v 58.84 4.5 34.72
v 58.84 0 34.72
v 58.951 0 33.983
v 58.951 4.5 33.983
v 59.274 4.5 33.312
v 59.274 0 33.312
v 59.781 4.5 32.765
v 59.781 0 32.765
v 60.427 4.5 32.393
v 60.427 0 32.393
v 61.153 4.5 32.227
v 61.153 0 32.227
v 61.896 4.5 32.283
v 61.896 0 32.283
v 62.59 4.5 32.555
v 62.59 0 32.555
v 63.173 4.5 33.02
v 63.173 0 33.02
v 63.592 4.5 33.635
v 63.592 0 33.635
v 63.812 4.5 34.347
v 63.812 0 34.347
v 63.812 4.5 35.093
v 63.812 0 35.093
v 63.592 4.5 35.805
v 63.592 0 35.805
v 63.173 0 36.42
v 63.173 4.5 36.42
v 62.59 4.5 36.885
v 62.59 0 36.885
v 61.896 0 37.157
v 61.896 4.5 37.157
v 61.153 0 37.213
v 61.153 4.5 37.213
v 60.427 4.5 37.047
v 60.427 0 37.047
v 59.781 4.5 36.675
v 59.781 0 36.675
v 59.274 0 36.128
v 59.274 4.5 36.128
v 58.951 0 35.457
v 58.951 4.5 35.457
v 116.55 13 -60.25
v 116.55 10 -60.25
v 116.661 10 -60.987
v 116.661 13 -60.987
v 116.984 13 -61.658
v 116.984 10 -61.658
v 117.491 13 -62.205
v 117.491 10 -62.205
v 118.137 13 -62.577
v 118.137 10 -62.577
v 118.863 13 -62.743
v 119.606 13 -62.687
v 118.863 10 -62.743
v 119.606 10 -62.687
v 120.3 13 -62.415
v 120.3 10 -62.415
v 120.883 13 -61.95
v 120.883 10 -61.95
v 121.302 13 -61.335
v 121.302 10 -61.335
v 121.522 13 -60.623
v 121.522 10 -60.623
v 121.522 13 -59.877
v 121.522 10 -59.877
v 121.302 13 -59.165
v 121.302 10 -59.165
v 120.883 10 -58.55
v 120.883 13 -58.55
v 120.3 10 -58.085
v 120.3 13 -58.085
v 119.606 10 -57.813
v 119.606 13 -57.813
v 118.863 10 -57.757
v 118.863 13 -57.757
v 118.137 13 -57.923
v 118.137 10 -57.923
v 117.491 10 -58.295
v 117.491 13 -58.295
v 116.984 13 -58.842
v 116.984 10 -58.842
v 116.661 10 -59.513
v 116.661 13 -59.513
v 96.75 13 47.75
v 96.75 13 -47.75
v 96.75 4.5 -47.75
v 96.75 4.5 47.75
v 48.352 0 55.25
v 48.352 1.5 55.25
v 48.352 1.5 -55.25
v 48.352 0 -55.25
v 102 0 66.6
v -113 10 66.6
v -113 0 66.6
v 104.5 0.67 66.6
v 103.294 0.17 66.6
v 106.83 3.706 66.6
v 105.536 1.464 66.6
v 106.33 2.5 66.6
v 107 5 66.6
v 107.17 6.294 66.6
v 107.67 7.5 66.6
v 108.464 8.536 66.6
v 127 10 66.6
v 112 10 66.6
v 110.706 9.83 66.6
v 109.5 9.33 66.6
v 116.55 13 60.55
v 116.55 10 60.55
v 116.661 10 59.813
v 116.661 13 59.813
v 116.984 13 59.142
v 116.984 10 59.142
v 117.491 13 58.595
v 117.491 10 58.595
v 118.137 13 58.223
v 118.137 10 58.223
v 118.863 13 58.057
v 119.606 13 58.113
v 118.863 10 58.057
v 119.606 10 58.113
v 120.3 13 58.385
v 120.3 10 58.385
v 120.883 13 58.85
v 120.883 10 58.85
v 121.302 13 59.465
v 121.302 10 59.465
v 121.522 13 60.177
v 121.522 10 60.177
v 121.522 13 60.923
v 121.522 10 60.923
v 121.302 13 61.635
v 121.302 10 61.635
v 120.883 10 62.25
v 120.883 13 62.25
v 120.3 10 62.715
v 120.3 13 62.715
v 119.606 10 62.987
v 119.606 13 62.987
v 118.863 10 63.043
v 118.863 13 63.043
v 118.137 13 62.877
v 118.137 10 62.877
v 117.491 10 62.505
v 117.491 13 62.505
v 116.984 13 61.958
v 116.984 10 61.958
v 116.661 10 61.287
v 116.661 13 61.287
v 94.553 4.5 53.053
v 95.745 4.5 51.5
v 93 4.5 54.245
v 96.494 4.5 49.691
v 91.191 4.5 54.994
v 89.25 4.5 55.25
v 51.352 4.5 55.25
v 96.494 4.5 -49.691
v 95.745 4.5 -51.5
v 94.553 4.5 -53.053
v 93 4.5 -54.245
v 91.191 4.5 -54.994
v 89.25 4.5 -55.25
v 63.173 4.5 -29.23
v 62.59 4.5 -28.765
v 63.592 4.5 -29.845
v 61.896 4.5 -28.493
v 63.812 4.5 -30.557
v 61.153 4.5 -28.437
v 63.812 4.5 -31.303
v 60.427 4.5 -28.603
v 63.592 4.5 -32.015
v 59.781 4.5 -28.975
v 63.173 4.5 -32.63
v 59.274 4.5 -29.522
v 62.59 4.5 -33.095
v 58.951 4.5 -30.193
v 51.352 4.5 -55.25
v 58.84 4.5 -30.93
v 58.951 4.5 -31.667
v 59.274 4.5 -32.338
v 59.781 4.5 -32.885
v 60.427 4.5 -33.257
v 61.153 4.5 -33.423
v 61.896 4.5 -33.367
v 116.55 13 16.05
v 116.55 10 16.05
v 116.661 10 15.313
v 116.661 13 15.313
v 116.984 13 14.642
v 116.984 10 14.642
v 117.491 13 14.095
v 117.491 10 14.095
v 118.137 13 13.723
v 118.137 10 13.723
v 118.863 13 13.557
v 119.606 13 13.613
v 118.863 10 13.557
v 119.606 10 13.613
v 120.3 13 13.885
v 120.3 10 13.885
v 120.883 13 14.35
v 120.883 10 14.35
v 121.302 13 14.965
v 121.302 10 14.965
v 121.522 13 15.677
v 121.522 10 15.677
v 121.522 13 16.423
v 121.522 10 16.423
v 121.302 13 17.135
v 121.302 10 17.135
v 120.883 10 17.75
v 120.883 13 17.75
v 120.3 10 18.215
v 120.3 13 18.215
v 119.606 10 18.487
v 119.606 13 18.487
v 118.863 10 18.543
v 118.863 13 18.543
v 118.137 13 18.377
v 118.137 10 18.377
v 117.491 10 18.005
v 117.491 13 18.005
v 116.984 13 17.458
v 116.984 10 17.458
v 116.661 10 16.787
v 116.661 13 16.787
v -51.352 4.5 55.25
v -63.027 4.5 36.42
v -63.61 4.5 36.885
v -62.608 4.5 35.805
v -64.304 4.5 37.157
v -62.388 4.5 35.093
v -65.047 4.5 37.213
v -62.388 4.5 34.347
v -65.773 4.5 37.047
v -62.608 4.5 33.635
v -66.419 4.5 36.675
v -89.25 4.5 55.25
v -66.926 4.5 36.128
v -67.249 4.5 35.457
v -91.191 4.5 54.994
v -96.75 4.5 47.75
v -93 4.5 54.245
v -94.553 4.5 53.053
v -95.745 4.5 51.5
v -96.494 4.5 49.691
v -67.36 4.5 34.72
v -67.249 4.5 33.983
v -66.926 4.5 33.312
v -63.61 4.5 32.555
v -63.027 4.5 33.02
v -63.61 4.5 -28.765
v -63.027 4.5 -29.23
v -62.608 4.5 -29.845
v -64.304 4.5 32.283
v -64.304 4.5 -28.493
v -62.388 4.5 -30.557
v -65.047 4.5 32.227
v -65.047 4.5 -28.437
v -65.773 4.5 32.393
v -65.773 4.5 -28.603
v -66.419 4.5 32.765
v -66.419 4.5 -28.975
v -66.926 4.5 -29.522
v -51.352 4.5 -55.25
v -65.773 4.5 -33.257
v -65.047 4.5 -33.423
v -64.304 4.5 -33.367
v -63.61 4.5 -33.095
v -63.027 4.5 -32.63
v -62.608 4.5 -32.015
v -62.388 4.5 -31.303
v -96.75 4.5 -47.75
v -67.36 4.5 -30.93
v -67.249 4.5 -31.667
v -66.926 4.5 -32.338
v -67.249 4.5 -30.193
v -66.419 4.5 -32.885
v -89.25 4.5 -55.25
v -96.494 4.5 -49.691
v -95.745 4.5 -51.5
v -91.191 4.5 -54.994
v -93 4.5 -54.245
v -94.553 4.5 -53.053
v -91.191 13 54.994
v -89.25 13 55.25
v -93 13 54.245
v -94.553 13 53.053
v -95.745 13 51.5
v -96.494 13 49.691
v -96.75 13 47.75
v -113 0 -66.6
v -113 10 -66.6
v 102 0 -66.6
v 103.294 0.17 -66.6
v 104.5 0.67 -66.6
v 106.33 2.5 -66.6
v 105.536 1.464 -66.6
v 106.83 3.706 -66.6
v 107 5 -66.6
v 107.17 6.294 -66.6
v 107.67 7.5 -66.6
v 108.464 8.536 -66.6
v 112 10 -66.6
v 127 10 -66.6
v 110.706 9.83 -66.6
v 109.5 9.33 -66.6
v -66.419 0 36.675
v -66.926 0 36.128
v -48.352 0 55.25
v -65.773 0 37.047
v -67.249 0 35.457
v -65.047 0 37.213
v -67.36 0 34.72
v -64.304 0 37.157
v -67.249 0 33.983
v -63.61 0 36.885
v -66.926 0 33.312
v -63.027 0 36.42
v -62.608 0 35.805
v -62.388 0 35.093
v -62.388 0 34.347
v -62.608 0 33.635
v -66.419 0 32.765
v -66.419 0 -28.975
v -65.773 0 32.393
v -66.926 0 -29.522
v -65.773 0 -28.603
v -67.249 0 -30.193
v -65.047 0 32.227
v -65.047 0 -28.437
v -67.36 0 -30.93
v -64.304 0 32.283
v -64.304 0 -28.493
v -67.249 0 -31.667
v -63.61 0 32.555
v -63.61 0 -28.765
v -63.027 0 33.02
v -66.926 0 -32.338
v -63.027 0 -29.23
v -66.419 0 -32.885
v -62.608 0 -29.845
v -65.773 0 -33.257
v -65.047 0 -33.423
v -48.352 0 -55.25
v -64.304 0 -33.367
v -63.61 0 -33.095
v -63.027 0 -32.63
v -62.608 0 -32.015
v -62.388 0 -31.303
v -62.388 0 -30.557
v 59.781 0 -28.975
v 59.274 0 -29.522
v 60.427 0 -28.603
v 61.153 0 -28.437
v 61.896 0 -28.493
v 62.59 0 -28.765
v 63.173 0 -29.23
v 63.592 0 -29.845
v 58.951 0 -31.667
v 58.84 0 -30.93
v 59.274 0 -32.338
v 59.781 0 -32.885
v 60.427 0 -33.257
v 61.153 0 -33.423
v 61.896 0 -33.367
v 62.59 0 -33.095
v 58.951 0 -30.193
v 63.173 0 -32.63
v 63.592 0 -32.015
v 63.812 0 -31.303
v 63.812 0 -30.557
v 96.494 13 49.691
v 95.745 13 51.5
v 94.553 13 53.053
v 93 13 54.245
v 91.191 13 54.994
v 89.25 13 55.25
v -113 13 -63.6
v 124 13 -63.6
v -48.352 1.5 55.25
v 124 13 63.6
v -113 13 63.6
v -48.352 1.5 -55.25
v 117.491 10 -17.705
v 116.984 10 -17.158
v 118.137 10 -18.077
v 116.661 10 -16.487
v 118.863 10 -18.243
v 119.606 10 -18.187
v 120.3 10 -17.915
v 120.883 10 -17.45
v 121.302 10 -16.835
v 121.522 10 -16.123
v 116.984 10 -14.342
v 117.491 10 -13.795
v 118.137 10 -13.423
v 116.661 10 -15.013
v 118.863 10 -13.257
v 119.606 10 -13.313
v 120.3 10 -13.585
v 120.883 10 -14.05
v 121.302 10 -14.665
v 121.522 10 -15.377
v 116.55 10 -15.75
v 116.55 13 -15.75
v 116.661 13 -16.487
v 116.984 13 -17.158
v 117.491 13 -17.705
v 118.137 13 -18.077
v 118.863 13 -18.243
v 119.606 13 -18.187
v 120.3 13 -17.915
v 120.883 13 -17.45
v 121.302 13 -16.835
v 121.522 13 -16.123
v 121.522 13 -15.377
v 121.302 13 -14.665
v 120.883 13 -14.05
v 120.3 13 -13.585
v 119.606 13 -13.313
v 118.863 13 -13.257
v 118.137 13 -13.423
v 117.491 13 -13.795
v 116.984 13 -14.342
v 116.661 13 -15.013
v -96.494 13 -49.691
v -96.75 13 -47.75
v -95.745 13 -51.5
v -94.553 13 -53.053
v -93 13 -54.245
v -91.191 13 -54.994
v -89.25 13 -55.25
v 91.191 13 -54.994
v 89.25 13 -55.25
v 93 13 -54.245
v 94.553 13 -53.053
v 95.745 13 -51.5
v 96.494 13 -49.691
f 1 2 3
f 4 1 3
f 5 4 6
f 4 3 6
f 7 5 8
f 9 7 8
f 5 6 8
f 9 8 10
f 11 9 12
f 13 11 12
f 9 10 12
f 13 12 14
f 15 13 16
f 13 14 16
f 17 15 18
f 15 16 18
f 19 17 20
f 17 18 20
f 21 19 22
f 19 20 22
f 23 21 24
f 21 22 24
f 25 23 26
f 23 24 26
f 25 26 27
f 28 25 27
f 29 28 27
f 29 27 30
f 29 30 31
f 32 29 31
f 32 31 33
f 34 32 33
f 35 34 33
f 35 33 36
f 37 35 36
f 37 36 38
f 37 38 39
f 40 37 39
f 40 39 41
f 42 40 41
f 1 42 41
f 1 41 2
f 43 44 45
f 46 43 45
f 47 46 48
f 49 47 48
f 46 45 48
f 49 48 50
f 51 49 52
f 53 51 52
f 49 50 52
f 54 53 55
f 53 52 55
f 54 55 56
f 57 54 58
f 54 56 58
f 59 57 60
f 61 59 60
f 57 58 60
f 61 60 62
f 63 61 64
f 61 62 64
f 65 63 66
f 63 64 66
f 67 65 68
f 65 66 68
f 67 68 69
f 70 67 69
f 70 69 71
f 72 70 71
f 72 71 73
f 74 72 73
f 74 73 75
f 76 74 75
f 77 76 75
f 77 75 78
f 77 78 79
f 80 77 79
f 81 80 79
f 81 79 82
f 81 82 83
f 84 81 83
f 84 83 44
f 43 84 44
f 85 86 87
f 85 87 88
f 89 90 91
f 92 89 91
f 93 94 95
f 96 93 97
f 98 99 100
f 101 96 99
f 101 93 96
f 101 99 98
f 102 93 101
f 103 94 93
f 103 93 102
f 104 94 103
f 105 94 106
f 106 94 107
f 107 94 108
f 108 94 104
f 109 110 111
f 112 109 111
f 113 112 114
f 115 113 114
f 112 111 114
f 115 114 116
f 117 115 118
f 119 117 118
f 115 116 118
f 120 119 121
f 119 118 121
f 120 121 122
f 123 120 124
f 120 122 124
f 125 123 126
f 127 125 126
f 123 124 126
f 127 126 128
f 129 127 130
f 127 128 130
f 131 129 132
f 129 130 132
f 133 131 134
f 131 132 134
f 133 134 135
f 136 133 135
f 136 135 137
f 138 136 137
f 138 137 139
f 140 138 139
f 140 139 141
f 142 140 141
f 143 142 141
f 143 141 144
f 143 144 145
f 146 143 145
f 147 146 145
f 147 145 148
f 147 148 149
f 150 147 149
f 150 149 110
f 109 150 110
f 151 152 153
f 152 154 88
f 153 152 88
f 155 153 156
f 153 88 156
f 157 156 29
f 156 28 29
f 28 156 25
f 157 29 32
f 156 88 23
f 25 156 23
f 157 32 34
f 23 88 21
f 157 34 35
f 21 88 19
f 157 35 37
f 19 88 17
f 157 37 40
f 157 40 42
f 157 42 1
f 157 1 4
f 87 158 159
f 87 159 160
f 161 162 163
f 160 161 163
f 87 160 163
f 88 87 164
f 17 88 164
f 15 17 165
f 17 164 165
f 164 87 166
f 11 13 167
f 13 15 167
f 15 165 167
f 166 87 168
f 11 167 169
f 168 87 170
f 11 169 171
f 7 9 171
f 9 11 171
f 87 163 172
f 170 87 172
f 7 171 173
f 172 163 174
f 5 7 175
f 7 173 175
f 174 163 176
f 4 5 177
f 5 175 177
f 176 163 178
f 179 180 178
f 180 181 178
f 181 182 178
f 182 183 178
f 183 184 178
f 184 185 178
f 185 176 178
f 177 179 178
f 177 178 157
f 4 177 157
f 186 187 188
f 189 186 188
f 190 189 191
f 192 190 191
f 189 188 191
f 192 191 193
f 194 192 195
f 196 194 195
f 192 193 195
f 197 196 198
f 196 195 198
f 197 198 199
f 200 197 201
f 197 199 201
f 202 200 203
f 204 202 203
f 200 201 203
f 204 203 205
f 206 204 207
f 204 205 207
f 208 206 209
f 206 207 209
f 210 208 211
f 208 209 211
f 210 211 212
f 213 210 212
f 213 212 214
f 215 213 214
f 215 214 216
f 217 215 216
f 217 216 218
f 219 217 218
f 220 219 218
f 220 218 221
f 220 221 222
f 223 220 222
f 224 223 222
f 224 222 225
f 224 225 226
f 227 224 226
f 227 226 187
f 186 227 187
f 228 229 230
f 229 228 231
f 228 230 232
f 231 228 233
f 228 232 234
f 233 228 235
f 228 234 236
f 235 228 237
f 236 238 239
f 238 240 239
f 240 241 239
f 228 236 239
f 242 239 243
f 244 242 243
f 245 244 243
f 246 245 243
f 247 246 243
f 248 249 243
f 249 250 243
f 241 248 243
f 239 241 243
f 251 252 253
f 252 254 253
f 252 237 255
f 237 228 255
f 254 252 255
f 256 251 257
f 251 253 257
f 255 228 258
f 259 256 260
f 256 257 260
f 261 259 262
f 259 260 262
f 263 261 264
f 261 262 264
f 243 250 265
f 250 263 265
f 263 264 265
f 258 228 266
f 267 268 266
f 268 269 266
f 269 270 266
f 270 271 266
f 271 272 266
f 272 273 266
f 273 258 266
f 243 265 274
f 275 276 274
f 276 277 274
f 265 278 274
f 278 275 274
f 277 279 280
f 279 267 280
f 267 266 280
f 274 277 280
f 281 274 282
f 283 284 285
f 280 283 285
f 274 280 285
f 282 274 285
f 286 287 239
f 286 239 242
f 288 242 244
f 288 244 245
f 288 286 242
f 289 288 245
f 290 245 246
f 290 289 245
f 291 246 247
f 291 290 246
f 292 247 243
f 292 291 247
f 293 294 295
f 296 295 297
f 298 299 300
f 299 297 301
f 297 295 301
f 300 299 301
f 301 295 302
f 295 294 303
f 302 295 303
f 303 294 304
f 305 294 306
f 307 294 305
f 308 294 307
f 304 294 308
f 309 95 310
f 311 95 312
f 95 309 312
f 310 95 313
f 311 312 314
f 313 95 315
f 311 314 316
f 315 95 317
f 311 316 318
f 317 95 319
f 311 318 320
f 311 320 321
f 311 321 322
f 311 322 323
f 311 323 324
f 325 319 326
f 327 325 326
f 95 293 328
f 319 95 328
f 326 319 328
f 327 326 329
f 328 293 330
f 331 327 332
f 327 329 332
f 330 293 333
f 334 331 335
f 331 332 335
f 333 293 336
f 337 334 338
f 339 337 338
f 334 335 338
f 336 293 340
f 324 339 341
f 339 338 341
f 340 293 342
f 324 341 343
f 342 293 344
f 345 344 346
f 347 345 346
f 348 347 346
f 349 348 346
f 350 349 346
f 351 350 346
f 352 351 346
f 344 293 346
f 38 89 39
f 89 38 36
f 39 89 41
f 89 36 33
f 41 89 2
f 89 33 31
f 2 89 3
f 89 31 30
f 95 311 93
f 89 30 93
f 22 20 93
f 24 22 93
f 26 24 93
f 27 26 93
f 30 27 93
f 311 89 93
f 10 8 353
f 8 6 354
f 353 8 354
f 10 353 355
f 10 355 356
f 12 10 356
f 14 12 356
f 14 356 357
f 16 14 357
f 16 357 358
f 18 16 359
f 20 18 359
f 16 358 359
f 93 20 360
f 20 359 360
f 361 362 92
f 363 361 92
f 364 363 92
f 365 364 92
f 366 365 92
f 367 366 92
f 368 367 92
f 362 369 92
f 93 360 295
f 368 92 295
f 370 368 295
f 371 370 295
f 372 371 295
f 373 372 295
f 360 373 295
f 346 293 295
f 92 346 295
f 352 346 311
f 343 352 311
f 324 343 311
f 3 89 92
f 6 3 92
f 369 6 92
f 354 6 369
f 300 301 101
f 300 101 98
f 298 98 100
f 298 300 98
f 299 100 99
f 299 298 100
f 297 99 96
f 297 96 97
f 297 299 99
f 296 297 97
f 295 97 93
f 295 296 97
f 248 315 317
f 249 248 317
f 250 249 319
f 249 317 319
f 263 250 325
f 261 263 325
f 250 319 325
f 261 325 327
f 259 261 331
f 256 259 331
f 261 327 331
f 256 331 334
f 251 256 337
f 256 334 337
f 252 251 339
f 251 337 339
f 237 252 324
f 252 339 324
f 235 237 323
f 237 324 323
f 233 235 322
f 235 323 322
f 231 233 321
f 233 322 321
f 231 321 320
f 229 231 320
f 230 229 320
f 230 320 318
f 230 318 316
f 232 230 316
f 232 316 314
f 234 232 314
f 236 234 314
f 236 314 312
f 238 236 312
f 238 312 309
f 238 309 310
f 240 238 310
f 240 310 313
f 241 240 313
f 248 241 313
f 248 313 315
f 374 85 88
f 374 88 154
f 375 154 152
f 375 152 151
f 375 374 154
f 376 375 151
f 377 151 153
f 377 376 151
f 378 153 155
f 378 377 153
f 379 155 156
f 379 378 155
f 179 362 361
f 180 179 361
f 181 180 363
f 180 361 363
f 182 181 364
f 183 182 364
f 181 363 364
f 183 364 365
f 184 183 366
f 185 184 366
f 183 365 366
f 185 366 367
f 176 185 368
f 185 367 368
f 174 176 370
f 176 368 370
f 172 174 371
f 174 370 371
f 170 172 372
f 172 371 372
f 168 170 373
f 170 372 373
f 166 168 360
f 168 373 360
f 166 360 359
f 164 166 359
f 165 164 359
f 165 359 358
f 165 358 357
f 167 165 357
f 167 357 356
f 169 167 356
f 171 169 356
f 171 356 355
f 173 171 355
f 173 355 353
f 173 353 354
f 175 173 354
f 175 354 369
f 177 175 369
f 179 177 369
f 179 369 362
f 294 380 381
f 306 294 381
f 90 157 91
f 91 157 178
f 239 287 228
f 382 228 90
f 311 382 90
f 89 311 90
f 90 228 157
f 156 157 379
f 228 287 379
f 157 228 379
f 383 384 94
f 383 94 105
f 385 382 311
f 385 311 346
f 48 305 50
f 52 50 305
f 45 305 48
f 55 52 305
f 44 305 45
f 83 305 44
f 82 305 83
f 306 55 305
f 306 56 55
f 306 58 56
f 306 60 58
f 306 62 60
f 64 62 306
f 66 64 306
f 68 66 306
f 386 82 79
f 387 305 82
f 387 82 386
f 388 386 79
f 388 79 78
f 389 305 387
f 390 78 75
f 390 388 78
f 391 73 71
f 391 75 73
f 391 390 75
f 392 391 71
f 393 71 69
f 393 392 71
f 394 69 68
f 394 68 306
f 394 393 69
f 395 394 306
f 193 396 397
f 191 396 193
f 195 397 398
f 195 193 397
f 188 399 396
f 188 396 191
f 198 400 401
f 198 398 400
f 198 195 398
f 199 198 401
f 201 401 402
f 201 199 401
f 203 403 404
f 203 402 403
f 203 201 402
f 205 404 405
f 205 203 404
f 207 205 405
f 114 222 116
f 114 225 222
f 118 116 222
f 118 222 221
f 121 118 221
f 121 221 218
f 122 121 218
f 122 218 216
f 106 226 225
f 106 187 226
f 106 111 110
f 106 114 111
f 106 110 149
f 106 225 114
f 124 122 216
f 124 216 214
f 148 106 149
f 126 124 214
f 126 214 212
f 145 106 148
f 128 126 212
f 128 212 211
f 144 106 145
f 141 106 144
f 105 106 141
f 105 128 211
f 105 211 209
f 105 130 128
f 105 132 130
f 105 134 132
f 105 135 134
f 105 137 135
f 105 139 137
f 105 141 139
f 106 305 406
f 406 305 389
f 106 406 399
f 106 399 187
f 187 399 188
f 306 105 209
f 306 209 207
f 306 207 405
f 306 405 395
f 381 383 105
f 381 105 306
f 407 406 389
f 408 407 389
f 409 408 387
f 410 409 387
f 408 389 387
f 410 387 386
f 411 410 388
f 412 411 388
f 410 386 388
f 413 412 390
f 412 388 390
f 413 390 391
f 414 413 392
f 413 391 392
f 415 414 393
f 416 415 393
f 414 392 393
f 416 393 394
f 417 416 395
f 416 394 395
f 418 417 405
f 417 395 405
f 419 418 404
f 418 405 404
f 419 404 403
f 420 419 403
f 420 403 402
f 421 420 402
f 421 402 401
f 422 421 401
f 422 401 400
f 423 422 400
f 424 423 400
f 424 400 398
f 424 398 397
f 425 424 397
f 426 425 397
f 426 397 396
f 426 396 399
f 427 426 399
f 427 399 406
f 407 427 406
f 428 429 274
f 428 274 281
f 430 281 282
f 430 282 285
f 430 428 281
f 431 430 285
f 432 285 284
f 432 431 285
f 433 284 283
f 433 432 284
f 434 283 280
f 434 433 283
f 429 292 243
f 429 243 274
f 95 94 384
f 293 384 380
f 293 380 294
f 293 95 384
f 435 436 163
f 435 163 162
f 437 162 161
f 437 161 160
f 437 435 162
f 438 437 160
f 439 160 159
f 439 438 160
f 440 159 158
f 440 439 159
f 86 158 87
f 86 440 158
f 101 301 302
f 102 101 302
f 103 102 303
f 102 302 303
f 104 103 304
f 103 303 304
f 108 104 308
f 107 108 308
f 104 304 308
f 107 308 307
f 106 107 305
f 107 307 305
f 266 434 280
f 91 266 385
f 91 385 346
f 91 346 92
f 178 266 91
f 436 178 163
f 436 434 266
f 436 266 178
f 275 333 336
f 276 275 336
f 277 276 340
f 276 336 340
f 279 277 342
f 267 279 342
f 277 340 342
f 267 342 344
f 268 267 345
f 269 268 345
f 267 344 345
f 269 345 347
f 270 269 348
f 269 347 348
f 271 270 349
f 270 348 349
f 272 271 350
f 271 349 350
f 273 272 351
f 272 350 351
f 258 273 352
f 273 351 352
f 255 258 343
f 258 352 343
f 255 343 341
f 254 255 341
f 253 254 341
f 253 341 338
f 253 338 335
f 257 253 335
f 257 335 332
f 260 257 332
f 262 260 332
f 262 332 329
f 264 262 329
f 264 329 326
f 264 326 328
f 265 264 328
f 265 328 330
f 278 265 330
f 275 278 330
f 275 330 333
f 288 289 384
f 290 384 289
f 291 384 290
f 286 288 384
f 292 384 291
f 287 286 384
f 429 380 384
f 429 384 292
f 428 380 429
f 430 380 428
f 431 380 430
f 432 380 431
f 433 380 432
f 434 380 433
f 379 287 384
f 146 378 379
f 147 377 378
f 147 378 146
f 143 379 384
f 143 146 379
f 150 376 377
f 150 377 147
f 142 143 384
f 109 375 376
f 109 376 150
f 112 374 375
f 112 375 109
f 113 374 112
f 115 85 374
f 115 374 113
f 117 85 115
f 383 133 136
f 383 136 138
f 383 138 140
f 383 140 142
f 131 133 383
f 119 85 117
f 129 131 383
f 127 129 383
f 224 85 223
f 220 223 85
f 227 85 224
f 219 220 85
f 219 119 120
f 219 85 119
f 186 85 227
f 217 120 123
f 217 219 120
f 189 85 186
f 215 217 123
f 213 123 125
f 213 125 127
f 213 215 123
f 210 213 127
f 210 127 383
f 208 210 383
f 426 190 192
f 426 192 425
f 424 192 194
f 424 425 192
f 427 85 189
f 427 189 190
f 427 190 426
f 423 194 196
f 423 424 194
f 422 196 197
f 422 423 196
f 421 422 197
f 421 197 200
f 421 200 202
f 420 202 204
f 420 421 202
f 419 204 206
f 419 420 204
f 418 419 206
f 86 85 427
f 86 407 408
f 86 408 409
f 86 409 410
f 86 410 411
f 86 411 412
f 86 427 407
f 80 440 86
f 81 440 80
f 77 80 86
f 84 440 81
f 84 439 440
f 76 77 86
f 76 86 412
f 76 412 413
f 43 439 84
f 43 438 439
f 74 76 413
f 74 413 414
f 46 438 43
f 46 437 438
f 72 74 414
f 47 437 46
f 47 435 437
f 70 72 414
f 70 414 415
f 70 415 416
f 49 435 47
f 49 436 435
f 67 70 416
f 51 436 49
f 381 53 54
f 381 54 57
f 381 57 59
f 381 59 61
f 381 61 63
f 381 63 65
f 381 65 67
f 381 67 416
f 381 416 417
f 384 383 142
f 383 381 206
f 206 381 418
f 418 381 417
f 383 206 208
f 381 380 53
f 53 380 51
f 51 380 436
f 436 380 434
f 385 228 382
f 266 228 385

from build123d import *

# Parameters (mm, degrees)
SKETCH1_W                        = 240
SKETCH1_H                        = 133.2
BOSS_EXTRUDE1_DEPTH              = 13
CUT_EXTRUDE1_DEPTH               = 8.5
F_1_8_27_NPSM_TAPPED_HOLE1_D     = 5
F_1_8_27_NPSM_TAPPED_HOLE1_DEPTH = 22.99
F_1_8_27_NPSM_TAPPED_HOLE1_TIP   = 1.502151548
SKETCH6_W                        = 96.703687768
SKETCH6_H                        = 110.5
CUT_EXTRUDE2_DEPTH               = 144.655177421
SKETCH32_W                       = 20
SKETCH32_H                       = 133.2
CUT_EXTRUDE10_DEPTH              = 10
FILLET1_START                    = -68
FILLET1_DEPTH                    = 136
FILLET1_START_2                  = -66.6
FILLET1_2_DEPTH                  = 133.2
M6X1_0_TAPPED_HOLE1_D            = 5
M6X1_0_TAPPED_HOLE1_DEPTH        = 15
M6X1_0_TAPPED_HOLE1_TIP          = 1.502151548
CHAMFER1_SIZE                    = 3


with BuildPart() as part:
    # Sketch1 → Boss-Extrude1 (new body)
    with BuildSketch(Plane(origin=(0, 0, 0), x_dir=(1, 0, 0), z_dir=(0, 1, 0))):
        with Locations((7, 0)):
            Rectangle(SKETCH1_W, SKETCH1_H)
    extrude(amount=BOSS_EXTRUDE1_DEPTH)

    # Sketch2 → Cut-Extrude1 (cut)
    with BuildSketch(Plane(origin=(0, 13, 0), x_dir=(1, 0, 0), z_dir=(0, 1, 0))):
        with BuildLine():
            Line((-89.25, 55.25), (89.25, 55.25))
            ThreePointArc((89.25, 55.25), (94.553300859, 53.053300859), (96.75, 47.75))
            Line((96.75, 47.75), (96.75, -47.75))
            ThreePointArc((96.75, -47.75), (94.553300859, -53.053300859), (89.25, -55.25))
            Line((89.25, -55.25), (-89.25, -55.25))
            ThreePointArc((-89.25, -55.25), (-94.553300859, -53.053300859), (-96.75, -47.75))
            Line((-96.75, -47.75), (-96.75, 47.75))
            ThreePointArc((-96.75, 47.75), (-94.553300859, 53.053300859), (-89.25, 55.25))
        make_face()
    extrude(amount=-CUT_EXTRUDE1_DEPTH, mode=Mode.SUBTRACT)

    # 1/8-27 NPSM Tapped Hole1
    with Locations(Plane(origin=(0, 4.5, 0), x_dir=(1, 0, 0), z_dir=(0, 1, 0))):
        with Locations((-64.86, 30.93), (61.34, 30.93), (61.34, -34.72), (-64.86, -34.72)):
            Hole(F_1_8_27_NPSM_TAPPED_HOLE1_D / 2, depth=F_1_8_27_NPSM_TAPPED_HOLE1_DEPTH)
            with Locations((0, 0, -(F_1_8_27_NPSM_TAPPED_HOLE1_DEPTH + F_1_8_27_NPSM_TAPPED_HOLE1_TIP / 2))):  # 118° drill point
                Cone(0, F_1_8_27_NPSM_TAPPED_HOLE1_D / 2, F_1_8_27_NPSM_TAPPED_HOLE1_TIP, mode=Mode.SUBTRACT)

    # Sketch6 → Cut-Extrude2 (cut, through all)
    with BuildSketch(Plane(origin=(0, 4.5, 0), x_dir=(1, 0, 0), z_dir=(0, 1, 0))):
        Rectangle(SKETCH6_W, SKETCH6_H)
    extrude(amount=-CUT_EXTRUDE2_DEPTH, mode=Mode.SUBTRACT)

    # Sketch32 → Cut-Extrude10 (cut)
    with BuildSketch(Plane.XZ):
        with Locations((117, 0)):
            Rectangle(SKETCH32_W, SKETCH32_H)
    extrude(amount=-CUT_EXTRUDE10_DEPTH, mode=Mode.SUBTRACT)

    # Fillet1: read off the stored shape, not the designer's step
    # Fillet1 outline → Fillet1 (cut)
    with BuildSketch(Plane.XY.offset(FILLET1_START)):
        with BuildLine():
            Line((107, 0), (107, 5))
            ThreePointArc((107, 5), (105.535533906, 1.464466094), (102, 0))
            Line((102, 0), (107, 0))
        make_face()
    extrude(amount=FILLET1_DEPTH, mode=Mode.SUBTRACT)

    # Fillet1 2 outline → Fillet1 2 (add)
    with BuildSketch(Plane.XY.offset(FILLET1_START_2)):
        with BuildLine():
            ThreePointArc((107, 5), (108.464466094, 8.535533906), (112, 10))
            Line((112, 10), (107, 10))
            Line((107, 10), (107, 5))
        make_face()
    extrude(amount=FILLET1_2_DEPTH)

    # M6x1.0 Tapped Hole1
    with Locations(Plane(origin=(0, 13, 0), x_dir=(1, 0, 0), z_dir=(0, 1, 0))):
        with Locations((119.05, 60.25), (119.05, 15.75), (119.05, -16.05), (119.05, -60.55)):
            Hole(M6X1_0_TAPPED_HOLE1_D / 2, depth=M6X1_0_TAPPED_HOLE1_DEPTH)
            with Locations((0, 0, -(M6X1_0_TAPPED_HOLE1_DEPTH + M6X1_0_TAPPED_HOLE1_TIP / 2))):  # 118° drill point
                Cone(0, M6X1_0_TAPPED_HOLE1_D / 2, M6X1_0_TAPPED_HOLE1_TIP, mode=Mode.SUBTRACT)

    # Chamfer1
    chamfer1_edges = [part.edges().sort_by_distance(p)[0] for p in [
        (7, 13, 66.6),
        (127, 13, 0),
        (7, 13, -66.6),
        (48.351843884, 4.5, 0),
        (-48.351843884, 4.5, 0),
    ]]
    chamfer(chamfer1_edges, length=CHAMFER1_SIZE - 0.0001)  # a hair under: the kernel refuses the full size


solid = part.part
